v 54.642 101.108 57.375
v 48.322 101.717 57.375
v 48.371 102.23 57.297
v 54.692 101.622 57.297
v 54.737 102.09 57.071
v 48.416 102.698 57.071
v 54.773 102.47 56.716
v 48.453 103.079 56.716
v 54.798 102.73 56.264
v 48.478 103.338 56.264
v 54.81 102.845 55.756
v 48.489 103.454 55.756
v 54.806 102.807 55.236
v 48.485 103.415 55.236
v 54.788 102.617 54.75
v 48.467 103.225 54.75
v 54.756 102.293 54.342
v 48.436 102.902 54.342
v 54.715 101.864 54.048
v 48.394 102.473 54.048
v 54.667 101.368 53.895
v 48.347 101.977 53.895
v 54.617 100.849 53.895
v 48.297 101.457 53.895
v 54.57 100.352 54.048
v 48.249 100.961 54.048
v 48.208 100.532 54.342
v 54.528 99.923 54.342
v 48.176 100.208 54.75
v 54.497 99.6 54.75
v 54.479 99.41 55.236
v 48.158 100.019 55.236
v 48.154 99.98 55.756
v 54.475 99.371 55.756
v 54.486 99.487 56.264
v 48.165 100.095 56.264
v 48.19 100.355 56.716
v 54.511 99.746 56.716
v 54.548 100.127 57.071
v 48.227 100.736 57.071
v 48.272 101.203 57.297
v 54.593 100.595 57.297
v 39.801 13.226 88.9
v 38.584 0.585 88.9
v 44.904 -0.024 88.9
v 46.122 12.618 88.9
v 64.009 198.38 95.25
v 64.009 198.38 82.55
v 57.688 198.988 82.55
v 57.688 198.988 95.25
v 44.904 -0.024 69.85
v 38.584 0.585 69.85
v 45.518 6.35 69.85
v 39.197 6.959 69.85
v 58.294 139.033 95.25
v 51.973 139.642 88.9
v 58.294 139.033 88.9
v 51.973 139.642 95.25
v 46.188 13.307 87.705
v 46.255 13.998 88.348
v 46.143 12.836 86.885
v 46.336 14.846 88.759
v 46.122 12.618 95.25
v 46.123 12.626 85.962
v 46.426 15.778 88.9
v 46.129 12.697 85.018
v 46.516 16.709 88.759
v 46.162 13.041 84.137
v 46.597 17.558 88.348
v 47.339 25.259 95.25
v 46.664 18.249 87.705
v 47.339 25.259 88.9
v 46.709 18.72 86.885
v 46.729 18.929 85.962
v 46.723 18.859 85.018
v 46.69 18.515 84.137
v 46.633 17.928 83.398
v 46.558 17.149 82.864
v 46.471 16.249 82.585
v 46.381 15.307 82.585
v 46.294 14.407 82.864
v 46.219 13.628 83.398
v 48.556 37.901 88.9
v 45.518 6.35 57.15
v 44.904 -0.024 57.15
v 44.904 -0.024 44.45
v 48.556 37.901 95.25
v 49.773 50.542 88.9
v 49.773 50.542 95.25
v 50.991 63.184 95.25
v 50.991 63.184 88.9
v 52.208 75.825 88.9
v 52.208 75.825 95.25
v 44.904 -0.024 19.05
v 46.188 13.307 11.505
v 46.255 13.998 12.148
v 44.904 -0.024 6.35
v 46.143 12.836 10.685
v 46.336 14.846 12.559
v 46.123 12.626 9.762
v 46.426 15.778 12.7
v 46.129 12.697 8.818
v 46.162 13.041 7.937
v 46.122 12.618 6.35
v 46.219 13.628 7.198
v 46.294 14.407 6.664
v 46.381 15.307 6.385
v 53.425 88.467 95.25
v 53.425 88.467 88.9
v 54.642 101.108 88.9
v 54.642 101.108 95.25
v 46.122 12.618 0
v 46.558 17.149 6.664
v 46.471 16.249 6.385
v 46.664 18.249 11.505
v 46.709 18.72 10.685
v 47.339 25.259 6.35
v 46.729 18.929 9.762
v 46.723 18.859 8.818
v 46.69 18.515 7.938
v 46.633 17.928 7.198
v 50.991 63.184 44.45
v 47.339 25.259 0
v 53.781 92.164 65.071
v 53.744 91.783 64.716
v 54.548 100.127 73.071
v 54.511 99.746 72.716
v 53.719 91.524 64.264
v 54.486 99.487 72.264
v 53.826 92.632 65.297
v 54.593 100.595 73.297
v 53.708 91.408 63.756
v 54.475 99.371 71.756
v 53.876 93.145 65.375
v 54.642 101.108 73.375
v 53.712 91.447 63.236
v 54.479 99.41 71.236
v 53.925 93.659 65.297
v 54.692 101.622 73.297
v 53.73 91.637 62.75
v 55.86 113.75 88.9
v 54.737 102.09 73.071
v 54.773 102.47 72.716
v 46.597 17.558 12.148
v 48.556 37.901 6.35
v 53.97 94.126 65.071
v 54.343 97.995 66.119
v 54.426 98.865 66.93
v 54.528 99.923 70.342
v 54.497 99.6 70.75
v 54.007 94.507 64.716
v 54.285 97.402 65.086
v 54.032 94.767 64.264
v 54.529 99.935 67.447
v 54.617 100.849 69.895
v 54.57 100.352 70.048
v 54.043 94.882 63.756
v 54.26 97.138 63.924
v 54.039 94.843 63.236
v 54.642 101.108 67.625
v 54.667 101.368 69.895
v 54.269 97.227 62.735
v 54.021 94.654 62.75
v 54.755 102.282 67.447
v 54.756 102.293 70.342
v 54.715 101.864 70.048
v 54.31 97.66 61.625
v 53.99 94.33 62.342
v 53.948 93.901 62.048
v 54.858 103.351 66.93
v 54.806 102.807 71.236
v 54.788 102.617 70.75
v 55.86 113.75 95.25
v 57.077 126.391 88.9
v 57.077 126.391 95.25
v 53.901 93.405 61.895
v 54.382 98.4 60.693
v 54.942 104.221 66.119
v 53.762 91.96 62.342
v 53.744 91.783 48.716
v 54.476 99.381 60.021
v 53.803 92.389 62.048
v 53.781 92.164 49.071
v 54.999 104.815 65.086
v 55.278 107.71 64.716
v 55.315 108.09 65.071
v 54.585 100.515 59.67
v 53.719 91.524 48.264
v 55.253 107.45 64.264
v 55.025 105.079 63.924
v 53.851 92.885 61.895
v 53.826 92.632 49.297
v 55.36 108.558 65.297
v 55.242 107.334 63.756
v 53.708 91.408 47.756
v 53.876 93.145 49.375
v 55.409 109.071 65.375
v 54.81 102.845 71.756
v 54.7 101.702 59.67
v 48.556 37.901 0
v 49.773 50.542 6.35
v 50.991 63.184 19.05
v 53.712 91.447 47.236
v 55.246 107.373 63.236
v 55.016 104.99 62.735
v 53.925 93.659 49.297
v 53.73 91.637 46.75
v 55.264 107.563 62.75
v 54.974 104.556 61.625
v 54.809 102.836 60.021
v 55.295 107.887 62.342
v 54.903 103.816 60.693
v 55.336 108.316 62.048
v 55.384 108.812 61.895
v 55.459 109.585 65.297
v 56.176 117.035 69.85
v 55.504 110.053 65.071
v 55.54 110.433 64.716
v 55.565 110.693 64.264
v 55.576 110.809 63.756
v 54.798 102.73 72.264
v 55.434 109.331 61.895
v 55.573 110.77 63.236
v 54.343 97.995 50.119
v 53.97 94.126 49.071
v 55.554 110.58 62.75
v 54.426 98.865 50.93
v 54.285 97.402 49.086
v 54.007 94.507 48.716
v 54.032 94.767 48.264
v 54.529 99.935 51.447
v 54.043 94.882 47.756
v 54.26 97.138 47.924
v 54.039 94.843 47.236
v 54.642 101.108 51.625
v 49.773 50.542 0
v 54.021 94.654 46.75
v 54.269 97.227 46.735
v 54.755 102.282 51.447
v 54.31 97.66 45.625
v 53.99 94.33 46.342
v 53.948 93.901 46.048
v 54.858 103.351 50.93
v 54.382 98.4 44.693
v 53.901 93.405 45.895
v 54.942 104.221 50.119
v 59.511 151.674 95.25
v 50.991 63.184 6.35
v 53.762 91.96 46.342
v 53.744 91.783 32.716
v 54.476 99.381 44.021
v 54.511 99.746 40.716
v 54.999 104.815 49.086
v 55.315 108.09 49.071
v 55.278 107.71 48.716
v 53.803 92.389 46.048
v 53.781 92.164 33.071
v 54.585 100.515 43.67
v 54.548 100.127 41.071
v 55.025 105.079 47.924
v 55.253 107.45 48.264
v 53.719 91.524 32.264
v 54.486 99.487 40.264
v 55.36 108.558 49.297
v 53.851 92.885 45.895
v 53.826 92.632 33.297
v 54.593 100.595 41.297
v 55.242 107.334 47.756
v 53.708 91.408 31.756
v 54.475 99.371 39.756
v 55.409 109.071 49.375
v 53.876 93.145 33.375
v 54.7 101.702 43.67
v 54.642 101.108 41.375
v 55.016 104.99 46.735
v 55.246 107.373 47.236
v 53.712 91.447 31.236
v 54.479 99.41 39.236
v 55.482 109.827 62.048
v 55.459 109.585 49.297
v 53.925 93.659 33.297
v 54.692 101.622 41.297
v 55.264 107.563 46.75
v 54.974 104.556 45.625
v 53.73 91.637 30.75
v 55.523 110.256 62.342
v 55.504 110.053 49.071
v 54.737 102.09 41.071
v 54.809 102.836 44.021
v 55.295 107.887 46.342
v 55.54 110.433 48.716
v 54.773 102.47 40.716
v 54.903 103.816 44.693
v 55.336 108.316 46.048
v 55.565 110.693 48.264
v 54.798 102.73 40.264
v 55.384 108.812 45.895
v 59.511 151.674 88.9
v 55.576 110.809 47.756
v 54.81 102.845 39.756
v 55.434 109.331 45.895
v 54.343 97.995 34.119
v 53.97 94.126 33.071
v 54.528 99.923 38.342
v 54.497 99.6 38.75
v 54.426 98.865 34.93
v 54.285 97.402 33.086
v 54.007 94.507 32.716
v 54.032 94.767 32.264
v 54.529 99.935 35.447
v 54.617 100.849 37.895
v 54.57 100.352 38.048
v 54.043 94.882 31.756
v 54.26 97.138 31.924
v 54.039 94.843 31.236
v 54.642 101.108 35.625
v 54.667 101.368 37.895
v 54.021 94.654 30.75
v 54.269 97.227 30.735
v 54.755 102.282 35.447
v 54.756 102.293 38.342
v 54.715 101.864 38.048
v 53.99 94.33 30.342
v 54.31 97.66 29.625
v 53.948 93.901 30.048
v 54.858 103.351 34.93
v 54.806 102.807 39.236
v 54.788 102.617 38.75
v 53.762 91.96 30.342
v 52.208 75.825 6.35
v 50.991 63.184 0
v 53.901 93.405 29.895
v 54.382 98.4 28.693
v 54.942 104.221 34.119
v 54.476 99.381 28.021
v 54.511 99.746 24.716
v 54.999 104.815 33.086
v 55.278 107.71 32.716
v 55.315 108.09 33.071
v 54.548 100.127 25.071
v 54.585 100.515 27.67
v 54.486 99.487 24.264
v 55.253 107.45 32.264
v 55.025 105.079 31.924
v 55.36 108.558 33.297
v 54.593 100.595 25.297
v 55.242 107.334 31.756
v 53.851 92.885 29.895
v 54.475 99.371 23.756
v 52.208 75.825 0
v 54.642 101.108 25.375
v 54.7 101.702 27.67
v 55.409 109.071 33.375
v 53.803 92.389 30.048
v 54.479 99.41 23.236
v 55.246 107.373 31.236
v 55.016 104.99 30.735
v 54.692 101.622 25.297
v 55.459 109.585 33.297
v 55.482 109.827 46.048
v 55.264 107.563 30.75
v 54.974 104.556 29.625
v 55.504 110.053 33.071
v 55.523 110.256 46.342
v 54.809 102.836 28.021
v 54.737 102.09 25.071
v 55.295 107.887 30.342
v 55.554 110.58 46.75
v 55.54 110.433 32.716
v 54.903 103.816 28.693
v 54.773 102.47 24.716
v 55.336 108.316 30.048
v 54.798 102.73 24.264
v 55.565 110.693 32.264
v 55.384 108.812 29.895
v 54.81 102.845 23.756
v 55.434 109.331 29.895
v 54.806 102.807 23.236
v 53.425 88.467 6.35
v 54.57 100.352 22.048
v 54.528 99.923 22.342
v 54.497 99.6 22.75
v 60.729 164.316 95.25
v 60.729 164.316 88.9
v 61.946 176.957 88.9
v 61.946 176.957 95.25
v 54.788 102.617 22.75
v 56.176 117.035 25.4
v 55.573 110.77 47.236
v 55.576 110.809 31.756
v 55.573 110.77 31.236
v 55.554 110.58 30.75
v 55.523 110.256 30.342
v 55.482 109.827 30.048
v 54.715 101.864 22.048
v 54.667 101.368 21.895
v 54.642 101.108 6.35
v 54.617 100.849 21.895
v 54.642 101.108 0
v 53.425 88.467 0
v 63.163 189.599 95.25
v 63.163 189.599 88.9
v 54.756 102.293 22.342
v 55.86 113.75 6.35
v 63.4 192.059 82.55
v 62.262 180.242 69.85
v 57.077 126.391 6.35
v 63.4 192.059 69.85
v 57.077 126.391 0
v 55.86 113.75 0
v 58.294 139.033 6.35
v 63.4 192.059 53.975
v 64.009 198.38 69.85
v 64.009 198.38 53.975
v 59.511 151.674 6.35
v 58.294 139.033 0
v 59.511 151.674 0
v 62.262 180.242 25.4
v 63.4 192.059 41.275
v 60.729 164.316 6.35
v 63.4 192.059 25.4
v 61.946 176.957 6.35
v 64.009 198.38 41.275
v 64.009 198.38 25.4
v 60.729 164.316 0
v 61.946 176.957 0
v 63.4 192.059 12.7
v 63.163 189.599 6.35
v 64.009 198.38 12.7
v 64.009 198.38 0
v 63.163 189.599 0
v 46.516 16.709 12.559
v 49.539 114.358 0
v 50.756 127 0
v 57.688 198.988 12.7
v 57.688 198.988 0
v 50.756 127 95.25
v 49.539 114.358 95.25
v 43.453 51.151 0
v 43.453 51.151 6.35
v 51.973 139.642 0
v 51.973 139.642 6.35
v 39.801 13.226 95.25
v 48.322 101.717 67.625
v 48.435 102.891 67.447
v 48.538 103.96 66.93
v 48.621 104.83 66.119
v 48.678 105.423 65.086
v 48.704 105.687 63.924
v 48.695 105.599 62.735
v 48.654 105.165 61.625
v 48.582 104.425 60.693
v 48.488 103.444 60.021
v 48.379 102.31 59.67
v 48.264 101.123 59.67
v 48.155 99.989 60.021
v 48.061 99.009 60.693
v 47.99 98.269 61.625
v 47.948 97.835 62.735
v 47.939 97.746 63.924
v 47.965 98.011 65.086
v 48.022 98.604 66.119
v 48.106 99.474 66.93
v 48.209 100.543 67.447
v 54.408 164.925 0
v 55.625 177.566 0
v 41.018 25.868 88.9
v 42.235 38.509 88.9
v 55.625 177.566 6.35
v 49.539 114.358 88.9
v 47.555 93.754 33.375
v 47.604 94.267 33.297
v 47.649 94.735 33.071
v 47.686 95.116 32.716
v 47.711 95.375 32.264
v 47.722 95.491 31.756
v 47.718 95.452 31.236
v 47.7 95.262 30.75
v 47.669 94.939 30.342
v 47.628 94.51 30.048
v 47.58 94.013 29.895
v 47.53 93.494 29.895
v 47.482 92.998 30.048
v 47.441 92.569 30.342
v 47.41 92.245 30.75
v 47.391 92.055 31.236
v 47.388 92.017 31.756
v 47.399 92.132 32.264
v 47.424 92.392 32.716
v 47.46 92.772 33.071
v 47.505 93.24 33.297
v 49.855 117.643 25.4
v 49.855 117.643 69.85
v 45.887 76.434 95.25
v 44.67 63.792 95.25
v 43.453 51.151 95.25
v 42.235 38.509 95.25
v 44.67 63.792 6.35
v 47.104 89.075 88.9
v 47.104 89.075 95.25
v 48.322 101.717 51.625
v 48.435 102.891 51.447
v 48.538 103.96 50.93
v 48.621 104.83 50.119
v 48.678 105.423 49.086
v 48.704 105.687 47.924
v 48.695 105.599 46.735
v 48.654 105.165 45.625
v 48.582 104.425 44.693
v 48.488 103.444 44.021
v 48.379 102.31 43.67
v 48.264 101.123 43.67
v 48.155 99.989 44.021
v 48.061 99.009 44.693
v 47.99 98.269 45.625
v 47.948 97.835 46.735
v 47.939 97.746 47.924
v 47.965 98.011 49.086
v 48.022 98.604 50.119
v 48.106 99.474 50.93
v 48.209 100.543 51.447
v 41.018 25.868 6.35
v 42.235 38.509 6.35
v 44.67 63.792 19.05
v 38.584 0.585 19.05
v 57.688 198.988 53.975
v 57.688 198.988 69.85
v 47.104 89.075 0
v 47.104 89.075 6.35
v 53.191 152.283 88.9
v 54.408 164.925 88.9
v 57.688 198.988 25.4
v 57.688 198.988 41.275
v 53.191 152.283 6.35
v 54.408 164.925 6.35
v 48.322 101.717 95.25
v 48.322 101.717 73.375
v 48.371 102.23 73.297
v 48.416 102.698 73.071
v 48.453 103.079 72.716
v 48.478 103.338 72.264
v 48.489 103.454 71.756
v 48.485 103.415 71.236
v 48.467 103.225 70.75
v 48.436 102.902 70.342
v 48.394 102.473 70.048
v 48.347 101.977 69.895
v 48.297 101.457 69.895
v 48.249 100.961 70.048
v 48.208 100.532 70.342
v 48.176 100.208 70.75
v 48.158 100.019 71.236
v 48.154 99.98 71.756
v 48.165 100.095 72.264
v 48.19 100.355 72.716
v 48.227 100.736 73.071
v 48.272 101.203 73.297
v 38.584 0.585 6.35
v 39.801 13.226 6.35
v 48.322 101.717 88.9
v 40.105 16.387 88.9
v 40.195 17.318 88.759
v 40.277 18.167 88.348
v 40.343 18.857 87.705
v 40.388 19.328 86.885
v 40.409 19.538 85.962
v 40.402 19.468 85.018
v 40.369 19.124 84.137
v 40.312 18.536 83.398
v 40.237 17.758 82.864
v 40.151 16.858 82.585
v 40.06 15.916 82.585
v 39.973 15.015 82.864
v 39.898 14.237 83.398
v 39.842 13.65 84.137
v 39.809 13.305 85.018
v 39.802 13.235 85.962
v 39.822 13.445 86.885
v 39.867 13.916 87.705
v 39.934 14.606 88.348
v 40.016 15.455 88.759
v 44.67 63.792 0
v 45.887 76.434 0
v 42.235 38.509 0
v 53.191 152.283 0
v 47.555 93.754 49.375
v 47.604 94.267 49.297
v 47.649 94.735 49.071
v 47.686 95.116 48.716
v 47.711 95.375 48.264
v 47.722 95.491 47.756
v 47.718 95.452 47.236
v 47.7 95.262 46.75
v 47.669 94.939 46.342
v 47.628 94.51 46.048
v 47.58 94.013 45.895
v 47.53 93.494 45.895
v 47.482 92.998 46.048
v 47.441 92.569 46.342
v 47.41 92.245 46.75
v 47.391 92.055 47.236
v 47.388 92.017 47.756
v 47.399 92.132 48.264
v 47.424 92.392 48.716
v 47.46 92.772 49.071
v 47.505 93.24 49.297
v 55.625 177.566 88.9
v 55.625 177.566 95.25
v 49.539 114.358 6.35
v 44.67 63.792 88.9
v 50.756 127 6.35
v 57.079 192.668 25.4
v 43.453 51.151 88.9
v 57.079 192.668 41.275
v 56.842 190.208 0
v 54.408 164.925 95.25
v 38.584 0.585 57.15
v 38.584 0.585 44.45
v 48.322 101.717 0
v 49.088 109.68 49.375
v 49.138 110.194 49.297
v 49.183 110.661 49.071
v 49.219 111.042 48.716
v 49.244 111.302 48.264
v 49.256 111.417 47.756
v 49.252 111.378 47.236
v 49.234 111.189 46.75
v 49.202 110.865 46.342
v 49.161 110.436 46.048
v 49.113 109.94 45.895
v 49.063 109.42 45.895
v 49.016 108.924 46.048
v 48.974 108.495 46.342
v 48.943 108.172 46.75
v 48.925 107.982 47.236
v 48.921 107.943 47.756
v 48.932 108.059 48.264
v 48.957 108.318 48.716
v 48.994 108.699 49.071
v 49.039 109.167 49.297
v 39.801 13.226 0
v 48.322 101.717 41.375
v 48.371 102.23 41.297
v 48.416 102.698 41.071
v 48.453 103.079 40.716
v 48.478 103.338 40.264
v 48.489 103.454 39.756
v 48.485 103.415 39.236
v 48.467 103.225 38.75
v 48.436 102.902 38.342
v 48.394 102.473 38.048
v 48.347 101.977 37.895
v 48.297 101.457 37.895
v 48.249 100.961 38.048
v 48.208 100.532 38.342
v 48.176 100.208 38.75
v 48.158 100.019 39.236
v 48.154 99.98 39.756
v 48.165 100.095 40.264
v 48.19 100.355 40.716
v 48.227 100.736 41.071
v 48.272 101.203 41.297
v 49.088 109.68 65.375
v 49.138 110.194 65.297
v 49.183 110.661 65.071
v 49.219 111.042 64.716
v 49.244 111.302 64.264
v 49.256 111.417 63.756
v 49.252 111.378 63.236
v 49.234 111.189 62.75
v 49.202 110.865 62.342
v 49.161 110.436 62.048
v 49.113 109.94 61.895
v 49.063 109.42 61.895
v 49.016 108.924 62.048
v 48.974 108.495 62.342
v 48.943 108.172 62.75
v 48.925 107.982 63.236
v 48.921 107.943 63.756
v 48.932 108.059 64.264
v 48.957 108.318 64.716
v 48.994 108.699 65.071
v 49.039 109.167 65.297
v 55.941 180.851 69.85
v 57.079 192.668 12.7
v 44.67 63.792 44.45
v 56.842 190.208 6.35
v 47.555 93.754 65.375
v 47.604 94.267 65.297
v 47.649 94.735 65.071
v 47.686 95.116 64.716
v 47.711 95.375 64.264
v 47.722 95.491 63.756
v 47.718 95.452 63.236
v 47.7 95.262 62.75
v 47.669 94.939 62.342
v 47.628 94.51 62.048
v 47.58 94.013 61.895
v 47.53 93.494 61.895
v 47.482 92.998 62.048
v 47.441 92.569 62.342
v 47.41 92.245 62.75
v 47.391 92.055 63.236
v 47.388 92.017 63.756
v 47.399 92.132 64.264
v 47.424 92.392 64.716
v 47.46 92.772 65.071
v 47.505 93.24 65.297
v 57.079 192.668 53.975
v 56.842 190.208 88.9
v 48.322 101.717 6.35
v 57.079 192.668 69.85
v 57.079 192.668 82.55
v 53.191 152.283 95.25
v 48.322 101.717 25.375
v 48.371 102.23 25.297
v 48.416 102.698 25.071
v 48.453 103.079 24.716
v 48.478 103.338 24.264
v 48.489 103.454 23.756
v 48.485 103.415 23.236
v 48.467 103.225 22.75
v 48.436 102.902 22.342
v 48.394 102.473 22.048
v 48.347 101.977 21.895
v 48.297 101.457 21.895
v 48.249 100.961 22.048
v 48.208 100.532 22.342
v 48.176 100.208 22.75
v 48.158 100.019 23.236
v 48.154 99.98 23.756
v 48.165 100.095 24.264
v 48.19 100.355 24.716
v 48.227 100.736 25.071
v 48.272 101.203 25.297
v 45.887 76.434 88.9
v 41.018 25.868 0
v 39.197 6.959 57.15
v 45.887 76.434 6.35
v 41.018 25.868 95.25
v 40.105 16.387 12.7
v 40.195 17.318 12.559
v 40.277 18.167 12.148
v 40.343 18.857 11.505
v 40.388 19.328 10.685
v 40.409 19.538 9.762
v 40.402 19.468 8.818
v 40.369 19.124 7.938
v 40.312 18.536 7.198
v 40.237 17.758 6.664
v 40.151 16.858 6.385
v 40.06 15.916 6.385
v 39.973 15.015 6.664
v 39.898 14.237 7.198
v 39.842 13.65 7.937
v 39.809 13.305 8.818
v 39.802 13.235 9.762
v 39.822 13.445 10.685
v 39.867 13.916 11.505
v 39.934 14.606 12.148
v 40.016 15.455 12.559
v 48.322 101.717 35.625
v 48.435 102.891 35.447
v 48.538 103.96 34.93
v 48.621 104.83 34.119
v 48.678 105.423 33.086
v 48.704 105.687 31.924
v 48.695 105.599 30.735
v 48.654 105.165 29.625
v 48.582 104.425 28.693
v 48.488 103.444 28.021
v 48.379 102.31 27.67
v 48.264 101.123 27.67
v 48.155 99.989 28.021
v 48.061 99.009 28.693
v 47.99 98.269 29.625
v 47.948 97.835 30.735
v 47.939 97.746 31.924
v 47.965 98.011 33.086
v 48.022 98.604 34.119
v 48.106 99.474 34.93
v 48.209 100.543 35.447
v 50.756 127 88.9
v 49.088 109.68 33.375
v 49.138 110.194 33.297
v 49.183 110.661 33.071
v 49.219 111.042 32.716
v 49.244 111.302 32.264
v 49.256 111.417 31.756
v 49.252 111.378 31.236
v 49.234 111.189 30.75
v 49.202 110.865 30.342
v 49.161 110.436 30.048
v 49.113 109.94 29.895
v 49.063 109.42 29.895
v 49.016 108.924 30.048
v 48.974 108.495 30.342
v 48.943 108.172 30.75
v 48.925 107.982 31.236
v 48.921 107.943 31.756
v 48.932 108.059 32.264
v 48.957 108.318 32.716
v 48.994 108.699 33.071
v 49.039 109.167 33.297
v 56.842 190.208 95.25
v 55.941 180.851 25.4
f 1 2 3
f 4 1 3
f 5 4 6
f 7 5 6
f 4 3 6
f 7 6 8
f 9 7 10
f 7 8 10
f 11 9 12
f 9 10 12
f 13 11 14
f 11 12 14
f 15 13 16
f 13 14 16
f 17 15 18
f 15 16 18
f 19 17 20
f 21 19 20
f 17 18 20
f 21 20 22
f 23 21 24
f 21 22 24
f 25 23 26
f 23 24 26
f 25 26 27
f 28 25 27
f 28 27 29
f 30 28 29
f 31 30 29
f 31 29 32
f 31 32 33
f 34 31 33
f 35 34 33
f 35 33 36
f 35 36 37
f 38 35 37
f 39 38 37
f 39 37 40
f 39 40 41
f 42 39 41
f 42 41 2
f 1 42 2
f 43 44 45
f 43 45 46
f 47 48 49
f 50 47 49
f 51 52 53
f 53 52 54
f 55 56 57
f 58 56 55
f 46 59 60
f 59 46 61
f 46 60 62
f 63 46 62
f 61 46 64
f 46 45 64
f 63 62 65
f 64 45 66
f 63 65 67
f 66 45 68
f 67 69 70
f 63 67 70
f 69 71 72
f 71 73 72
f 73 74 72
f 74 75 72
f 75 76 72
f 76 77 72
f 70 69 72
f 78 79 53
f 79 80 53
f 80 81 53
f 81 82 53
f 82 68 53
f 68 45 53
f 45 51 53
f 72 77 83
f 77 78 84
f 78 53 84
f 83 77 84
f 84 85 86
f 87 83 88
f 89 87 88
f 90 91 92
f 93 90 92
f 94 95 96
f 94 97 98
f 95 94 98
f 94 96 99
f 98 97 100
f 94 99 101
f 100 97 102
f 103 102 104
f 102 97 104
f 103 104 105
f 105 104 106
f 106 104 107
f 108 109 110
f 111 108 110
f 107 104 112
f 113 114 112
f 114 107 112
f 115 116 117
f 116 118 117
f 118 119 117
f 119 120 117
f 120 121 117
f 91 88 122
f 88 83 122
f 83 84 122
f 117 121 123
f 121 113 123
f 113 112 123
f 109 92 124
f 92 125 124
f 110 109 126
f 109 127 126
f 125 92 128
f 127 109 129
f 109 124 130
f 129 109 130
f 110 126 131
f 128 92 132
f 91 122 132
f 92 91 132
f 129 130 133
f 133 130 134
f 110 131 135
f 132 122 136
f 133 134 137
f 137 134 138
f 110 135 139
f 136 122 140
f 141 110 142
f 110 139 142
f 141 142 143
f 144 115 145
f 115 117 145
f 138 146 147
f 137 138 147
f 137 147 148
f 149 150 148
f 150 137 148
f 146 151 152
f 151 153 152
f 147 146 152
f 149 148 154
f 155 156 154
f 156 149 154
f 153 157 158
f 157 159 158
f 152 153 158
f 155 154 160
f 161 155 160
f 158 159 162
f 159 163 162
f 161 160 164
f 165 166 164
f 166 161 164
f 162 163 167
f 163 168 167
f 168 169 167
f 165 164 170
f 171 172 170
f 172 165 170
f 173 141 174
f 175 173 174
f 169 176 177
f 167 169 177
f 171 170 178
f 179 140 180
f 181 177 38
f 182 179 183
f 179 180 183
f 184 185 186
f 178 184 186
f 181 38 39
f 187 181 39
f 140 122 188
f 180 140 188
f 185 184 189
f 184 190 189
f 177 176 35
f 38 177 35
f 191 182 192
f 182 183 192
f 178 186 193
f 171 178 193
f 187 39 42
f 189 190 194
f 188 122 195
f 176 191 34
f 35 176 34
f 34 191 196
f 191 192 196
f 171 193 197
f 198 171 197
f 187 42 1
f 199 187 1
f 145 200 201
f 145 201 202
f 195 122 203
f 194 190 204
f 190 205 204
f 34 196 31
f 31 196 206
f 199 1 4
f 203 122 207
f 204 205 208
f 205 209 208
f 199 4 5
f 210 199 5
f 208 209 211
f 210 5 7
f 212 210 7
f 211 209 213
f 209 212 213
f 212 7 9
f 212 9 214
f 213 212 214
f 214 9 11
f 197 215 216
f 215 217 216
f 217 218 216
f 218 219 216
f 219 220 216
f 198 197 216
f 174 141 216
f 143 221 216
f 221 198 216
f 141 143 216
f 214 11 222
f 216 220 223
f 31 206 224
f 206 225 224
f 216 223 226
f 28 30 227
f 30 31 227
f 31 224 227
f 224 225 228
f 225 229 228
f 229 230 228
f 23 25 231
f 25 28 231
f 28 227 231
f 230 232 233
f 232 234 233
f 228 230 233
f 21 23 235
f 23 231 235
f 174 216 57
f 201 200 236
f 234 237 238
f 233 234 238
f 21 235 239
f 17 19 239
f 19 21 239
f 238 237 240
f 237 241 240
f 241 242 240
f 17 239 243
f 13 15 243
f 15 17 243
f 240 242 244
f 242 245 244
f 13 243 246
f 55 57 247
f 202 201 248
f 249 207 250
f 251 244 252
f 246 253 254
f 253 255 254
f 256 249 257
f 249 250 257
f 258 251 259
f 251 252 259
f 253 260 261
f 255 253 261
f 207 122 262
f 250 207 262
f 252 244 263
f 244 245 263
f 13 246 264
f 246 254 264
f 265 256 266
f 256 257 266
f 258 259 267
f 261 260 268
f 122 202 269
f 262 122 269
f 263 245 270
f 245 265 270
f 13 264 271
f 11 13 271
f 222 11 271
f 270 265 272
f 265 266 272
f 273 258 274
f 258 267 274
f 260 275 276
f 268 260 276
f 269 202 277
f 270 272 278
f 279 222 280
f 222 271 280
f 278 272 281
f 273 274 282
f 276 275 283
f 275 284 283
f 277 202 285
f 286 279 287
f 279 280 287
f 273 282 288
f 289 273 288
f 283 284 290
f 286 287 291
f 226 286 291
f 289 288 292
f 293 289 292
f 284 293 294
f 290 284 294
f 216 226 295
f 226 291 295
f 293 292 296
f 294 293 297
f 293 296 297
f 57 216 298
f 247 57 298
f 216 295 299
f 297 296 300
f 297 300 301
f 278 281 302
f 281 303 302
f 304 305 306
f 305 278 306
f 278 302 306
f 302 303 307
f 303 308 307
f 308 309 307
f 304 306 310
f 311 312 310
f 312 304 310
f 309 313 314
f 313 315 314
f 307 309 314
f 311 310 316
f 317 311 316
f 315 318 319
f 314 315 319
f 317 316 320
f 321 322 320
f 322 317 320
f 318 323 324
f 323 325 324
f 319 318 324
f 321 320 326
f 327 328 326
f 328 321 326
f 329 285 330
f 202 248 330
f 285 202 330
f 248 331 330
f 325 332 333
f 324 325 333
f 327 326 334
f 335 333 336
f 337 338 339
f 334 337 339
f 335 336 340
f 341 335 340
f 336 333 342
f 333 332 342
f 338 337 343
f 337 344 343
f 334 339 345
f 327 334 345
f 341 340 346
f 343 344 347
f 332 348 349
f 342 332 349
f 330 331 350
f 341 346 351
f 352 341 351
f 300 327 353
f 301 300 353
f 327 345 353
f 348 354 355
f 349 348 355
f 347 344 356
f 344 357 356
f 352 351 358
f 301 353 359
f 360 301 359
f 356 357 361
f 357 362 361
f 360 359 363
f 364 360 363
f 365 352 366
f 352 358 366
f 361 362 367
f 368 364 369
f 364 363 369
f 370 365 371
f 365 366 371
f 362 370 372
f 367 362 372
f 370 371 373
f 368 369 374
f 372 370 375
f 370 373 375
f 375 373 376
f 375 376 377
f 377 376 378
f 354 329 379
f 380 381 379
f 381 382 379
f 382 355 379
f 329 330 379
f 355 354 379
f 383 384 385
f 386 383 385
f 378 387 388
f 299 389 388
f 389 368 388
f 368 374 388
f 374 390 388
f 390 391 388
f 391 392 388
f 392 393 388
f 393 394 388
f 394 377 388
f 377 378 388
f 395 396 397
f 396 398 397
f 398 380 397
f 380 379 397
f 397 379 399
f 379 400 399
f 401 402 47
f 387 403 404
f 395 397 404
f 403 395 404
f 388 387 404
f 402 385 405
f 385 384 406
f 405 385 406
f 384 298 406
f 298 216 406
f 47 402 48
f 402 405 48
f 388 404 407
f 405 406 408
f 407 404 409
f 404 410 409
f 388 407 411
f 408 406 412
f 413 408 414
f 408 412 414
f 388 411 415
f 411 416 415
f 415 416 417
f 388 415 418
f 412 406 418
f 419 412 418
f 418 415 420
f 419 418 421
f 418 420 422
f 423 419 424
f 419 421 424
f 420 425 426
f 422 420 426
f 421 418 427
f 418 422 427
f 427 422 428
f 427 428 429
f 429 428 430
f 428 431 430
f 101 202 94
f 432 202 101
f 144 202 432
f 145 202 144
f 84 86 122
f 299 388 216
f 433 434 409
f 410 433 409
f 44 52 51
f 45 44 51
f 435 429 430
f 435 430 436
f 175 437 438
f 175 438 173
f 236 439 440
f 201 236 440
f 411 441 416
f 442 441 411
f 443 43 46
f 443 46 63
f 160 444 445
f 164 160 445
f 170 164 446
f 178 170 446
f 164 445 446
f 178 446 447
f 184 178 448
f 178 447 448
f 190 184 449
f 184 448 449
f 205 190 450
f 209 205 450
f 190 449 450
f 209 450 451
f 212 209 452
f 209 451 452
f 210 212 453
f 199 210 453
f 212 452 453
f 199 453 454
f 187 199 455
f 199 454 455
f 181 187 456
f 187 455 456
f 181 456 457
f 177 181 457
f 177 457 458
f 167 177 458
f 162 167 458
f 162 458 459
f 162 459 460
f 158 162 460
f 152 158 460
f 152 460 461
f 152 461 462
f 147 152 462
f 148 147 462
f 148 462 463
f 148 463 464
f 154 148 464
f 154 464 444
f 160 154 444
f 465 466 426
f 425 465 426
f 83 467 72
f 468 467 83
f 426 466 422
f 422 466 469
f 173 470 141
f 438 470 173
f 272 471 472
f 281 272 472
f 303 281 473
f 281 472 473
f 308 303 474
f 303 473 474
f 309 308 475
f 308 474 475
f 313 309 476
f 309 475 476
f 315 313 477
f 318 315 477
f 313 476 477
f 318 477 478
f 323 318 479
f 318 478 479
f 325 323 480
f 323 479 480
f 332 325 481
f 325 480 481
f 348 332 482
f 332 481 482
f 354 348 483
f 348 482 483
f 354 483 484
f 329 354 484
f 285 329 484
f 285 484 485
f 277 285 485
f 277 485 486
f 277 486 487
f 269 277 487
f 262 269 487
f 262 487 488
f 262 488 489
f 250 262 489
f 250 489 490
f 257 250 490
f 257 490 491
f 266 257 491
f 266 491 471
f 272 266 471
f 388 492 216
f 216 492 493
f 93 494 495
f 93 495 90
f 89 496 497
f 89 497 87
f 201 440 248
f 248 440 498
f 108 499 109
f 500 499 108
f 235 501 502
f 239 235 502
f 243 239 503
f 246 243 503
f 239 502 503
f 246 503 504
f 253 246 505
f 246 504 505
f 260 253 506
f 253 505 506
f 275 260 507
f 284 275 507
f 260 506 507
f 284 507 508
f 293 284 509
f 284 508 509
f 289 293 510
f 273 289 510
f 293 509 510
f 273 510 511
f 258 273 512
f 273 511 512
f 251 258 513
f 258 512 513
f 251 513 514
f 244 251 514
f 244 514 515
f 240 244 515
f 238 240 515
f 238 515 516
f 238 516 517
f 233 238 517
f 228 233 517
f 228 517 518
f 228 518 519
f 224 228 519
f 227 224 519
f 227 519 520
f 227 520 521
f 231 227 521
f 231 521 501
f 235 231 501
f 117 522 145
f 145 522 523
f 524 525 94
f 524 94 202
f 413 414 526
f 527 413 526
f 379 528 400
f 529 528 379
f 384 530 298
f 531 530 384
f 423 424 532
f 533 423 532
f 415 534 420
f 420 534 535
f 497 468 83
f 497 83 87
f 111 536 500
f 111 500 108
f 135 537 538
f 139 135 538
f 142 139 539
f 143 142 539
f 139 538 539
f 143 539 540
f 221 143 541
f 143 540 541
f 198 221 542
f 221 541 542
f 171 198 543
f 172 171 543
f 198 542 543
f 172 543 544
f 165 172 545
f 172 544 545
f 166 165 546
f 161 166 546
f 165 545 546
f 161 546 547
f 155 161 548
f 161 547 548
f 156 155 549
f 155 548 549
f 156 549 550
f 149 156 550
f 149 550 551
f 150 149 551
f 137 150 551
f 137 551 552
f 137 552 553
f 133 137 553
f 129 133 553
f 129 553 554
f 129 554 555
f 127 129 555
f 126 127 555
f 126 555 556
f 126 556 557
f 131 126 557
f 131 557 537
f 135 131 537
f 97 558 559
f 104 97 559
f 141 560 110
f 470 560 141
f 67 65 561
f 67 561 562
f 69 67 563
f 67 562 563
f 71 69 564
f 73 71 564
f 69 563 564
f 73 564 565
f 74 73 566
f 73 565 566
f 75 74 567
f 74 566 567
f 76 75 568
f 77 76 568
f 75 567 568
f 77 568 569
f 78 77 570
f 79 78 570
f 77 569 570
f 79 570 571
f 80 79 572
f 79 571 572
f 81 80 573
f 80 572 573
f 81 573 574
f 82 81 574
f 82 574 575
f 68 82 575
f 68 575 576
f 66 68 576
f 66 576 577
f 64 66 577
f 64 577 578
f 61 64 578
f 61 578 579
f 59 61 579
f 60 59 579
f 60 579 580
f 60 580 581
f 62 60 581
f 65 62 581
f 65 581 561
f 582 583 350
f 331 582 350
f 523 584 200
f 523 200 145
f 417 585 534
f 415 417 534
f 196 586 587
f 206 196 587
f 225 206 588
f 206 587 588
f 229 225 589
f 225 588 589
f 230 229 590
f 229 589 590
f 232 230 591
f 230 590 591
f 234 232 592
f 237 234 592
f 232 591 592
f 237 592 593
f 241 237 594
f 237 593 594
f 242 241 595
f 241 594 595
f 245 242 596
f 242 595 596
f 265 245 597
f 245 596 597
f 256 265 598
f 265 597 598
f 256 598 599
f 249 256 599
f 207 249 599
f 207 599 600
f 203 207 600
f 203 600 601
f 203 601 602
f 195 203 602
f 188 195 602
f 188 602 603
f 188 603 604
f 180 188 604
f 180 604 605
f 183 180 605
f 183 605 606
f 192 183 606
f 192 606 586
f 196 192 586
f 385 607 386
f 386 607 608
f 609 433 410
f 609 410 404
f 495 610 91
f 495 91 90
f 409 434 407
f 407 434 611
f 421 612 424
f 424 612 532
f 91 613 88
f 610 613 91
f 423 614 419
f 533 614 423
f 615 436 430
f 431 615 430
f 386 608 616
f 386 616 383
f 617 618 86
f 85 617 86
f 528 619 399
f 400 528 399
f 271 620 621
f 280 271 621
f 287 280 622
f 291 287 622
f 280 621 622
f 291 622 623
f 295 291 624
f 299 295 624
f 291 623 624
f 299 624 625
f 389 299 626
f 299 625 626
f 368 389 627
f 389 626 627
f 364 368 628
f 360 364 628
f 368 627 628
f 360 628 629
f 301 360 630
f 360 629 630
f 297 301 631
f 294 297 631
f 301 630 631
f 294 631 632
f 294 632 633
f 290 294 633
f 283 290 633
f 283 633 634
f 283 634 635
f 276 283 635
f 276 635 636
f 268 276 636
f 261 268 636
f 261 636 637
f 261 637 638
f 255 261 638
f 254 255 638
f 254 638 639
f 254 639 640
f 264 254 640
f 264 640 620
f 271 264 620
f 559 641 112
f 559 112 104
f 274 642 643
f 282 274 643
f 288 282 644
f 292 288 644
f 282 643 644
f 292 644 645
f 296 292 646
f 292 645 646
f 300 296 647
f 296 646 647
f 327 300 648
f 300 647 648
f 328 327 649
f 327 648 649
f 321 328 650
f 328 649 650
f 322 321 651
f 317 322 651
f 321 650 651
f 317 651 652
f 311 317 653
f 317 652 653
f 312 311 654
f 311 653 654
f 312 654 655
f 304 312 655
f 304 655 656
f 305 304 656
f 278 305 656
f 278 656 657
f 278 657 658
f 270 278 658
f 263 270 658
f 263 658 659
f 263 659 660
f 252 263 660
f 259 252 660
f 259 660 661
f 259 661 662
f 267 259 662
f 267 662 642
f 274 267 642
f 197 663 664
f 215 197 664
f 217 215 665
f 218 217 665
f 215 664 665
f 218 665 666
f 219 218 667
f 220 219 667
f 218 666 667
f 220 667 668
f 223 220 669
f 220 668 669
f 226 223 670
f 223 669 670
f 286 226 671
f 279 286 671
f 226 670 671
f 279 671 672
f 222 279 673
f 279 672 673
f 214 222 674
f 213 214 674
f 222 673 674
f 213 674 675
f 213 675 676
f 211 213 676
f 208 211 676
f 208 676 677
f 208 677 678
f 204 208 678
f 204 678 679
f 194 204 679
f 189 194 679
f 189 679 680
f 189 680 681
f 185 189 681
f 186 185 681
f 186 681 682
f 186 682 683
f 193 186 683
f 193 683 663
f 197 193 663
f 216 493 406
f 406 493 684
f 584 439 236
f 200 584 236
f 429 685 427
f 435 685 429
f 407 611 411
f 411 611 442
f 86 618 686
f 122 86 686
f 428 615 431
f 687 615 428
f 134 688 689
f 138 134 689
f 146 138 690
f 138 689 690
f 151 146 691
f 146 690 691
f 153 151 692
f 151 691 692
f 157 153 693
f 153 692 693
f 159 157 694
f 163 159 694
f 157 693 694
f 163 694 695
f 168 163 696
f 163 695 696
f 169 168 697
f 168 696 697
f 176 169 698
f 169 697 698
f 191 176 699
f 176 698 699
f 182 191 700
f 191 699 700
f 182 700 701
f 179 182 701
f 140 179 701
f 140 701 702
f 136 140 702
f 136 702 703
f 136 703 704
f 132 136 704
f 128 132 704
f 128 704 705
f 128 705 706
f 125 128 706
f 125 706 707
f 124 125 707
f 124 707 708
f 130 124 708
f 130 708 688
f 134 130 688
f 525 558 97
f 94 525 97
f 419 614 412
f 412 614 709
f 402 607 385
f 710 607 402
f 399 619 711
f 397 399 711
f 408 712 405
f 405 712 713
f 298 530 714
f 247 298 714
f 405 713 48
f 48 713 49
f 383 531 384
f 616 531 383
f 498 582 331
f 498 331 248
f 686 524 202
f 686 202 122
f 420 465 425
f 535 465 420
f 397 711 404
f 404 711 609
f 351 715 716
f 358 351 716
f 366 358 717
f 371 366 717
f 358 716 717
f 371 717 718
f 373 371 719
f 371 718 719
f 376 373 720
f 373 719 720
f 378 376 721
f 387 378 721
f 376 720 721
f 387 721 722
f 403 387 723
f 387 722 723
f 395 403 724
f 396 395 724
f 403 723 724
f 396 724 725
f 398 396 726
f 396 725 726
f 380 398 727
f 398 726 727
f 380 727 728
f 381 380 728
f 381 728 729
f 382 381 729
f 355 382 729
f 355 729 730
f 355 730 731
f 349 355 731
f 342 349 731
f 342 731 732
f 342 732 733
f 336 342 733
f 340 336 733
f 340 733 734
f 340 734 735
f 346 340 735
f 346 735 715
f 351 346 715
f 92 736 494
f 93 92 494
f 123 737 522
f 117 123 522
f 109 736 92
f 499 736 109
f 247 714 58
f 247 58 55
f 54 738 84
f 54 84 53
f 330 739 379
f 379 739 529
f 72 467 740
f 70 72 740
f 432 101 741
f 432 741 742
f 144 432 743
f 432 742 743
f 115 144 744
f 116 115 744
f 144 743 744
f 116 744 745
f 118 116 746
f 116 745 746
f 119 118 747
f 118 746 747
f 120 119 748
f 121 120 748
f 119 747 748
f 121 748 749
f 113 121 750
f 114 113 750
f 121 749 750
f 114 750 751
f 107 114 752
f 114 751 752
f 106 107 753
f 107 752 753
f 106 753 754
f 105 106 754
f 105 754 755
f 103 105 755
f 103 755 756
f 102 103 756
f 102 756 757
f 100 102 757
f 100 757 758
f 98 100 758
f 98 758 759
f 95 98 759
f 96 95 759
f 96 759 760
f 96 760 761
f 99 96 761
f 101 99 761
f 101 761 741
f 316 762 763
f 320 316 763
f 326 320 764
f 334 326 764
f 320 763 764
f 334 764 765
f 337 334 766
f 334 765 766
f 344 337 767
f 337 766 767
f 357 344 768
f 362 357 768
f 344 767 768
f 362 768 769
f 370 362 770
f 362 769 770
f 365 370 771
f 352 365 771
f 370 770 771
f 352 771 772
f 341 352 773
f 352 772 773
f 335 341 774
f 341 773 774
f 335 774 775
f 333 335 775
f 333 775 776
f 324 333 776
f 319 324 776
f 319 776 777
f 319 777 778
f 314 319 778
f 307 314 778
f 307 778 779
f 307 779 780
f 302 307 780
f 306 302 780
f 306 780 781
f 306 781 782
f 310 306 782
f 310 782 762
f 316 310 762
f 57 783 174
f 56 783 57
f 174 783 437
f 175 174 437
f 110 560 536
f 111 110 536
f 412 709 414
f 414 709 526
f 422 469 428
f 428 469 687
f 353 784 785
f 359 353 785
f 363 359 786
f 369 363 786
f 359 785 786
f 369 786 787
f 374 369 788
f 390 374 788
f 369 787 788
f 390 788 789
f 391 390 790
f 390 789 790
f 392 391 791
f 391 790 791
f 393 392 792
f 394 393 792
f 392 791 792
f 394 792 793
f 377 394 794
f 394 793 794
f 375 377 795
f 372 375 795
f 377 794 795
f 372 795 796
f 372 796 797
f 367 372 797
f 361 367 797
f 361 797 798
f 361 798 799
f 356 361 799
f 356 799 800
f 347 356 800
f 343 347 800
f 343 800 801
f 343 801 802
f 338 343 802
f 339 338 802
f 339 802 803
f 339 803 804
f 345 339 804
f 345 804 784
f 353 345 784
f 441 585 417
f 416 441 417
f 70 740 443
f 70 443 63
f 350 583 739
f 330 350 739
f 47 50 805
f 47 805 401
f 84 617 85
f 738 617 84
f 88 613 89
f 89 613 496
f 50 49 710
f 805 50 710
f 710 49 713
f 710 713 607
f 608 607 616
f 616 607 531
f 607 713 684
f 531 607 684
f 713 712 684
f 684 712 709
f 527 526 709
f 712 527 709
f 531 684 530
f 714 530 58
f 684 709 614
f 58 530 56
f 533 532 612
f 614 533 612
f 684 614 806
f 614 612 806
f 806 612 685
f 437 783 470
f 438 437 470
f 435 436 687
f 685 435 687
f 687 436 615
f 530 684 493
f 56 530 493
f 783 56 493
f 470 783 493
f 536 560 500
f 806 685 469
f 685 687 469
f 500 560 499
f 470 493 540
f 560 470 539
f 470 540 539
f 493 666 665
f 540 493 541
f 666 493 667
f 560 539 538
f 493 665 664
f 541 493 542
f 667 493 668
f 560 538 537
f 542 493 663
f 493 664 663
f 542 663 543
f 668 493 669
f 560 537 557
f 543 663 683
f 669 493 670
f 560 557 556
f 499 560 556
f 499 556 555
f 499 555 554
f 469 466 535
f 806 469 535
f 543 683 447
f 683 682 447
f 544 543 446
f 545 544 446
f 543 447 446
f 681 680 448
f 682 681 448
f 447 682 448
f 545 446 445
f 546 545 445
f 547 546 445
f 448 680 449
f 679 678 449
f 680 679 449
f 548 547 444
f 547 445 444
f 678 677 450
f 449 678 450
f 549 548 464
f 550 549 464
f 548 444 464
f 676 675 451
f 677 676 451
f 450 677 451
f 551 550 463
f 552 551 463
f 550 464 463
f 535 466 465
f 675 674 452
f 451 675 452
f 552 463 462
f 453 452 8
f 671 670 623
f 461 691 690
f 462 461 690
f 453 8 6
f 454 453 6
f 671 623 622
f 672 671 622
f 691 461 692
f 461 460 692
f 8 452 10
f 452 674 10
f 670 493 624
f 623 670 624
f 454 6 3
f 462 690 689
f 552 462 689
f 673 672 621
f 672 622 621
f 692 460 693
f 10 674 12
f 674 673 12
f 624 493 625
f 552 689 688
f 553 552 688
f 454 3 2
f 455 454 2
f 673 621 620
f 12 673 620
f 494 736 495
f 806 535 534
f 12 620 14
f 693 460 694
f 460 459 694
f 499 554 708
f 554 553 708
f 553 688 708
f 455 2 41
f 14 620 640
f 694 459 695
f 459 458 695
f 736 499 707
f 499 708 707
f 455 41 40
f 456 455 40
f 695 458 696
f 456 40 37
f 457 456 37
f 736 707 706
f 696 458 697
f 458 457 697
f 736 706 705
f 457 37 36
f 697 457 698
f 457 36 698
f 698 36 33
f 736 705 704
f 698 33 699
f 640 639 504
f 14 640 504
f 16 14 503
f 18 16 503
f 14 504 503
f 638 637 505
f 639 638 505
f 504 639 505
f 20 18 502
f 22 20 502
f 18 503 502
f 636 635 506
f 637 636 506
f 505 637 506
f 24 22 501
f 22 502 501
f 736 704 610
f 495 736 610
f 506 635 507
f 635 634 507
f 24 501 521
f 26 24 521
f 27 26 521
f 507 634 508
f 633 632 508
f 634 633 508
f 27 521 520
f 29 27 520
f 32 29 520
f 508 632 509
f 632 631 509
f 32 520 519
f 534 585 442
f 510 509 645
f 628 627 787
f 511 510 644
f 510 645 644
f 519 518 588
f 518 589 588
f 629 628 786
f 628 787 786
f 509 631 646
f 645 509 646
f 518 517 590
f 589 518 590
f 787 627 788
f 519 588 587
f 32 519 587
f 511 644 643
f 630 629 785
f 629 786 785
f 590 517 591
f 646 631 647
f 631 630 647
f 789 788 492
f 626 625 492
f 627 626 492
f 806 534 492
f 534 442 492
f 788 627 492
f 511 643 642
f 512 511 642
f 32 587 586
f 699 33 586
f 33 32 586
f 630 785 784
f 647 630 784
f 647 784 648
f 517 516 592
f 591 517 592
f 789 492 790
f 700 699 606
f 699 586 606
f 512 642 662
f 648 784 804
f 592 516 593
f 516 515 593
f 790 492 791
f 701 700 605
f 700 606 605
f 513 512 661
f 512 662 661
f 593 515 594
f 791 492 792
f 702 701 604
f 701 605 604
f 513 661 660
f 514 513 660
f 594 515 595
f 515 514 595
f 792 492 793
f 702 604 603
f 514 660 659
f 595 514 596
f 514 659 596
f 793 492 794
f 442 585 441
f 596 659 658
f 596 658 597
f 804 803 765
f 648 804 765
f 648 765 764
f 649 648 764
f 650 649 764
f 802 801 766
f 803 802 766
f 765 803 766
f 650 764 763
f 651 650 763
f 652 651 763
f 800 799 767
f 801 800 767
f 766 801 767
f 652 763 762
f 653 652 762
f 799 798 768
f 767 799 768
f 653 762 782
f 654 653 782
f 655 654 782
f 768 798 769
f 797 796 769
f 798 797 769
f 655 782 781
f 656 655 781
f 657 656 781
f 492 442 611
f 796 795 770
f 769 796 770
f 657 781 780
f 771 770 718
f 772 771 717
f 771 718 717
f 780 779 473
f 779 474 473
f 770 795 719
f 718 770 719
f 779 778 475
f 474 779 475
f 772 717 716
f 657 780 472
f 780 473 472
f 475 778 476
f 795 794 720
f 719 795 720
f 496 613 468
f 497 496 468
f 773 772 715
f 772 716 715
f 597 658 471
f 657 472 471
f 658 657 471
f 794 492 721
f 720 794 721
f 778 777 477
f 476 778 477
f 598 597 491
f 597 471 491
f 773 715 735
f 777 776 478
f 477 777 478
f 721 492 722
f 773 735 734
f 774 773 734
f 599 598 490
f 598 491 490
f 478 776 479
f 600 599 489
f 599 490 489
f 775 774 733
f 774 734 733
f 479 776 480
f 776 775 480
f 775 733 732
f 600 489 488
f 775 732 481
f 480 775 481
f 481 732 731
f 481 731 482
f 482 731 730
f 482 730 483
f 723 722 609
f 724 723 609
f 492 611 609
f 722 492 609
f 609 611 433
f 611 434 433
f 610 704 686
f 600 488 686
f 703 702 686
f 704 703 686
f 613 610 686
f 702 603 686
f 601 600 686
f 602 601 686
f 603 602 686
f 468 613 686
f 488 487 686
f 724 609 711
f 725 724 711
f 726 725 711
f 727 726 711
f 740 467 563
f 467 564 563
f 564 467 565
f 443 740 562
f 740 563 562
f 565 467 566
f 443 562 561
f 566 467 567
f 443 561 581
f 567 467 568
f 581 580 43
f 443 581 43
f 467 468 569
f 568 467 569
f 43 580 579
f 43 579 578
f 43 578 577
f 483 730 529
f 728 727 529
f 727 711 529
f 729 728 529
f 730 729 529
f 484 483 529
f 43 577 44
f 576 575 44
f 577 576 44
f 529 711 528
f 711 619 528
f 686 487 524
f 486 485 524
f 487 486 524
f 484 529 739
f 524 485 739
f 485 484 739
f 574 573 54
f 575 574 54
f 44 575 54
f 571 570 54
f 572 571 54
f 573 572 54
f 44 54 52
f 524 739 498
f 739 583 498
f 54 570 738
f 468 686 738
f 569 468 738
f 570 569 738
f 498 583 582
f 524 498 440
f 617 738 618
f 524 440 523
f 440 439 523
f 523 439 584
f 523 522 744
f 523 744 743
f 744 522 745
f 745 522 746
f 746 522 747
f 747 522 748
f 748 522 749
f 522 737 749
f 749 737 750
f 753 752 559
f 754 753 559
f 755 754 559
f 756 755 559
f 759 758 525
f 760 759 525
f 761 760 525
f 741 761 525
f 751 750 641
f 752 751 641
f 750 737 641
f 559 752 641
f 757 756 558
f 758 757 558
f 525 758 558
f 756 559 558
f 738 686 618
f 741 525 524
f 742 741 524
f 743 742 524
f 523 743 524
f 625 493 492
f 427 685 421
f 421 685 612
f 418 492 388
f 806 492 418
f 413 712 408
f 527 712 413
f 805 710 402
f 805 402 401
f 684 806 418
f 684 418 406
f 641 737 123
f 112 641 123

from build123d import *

# Parameters (mm, degrees)
BOSS_EXTRUDE1_DEPTH = 95.25
SKETCH3_R           = 3.175
CUT_EXTRUDE1_DEPTH  = 26.366155757
SKETCH4_R           = 4
SKETCH4_R_2         = 1.75
CUT_EXTRUDE2_DEPTH  = 26.366155757
LPATTERN1_COUNT     = 2
LPATTERN1_PITCH     = 16
LPATTERN1_COL_COUNT = 2
LPATTERN1_COL_PITCH = 16
SKETCH5_W           = 44.45
SKETCH5_H           = 63.5
CUT_EXTRUDE3_DEPTH  = 26.366155757
SKETCH6_W           = 25.4
SKETCH6_H           = 63.5
CUT_EXTRUDE4_DEPTH  = 26.366155757
SKETCH8_W           = 6.35
SKETCH8_H           = 12.7
CUT_EXTRUDE6_DEPTH  = 26.366155757
LPATTERN2_COUNT     = 18
LPATTERN2_PITCH     = 25.4
SKETCH9_W           = 12.7
SKETCH9_H           = 6.403441613
CUT_EXTRUDE7_DEPTH  = 26.366155757
SKETCH10_W          = 12.7
SKETCH10_H          = 6.35
CUT_EXTRUDE8_DEPTH  = 26.366155757


with BuildPart() as part:
    # Sketch2 → Boss-Extrude1 (new body)
    with BuildSketch(Plane.XY):
        Polygon((38.583668647, 0.58465909), (44.904434507, -0.023961438), (64.008541785, 198.379778502), (57.687775925, 198.988399031), align=None)
    extrude(amount=BOSS_EXTRUDE1_DEPTH)

    # Sketch3 → Cut-Extrude1 (cut, through all)
    with BuildSketch(Plane(origin=(38.173444207, -3.675684609, 0), x_dir=(0, 0, 1), z_dir=(-0.995396198, 0.095845753, 0))):
        with Locations((9.525, 20.155048192)):
            Circle(SKETCH3_R)
        with Locations((85.725, 20.155048192)):
            Circle(SKETCH3_R)
    extrude(amount=-CUT_EXTRUDE1_DEPTH, mode=Mode.SUBTRACT)

    # Sketch4 → Cut-Extrude2 (cut, through all)
    with BuildSketch(Plane(origin=(38.173444207, -3.675684609, 0), x_dir=(0, 0, 1), z_dir=(-0.995396198, 0.095845753, 0))):
        with Locations((47.625, 105.880048192)):
            Circle(SKETCH4_R)
        with Locations((47.625, 113.880048192)):
            Circle(SKETCH4_R_2)
        with Locations((55.625, 105.880048192)):
            Circle(SKETCH4_R_2)
        with Locations((47.625, 97.880048192)):
            Circle(SKETCH4_R_2)
        with Locations((39.625, 105.880048192)):
            Circle(SKETCH4_R_2)
    cut_extrude2 = extrude(amount=-CUT_EXTRUDE2_DEPTH, mode=Mode.SUBTRACT)

    # LPattern1: Cut-Extrude2 ×2
    with Locations(*[(0, 0, i * LPATTERN1_PITCH) for i in range(1, LPATTERN1_COUNT)]):
        add(cut_extrude2, mode=Mode.SUBTRACT)

    # LPattern1 col: Cut-Extrude2 ×2
    with Locations(*[(0, 0, -i * LPATTERN1_COL_PITCH) for i in range(1, LPATTERN1_COL_COUNT)]):
        add(cut_extrude2, mode=Mode.SUBTRACT)

    # Sketch5 → Cut-Extrude3 (cut, through all)
    with BuildSketch(Plane(origin=(38.173444207, -3.675684609, 0), x_dir=(0, 0, 1), z_dir=(-0.995396198, 0.095845753, 0))):
        with Locations((47.625, 153.630048192)):
            Rectangle(SKETCH5_W, SKETCH5_H)
    extrude(amount=-CUT_EXTRUDE3_DEPTH, mode=Mode.SUBTRACT)

    # Sketch6 → Cut-Extrude4 (cut, through all)
    with BuildSketch(Plane(origin=(38.173444207, -3.675684609, 0), x_dir=(0, 0, 1), z_dir=(-0.995396198, 0.095845753, 0))):
        with Locations((31.75, 36.030048192)):
            Rectangle(SKETCH6_W, SKETCH6_H)
    extrude(amount=-CUT_EXTRUDE4_DEPTH, mode=Mode.SUBTRACT)

    # Sketch8 → Cut-Extrude6 (cut, through all)
    with BuildSketch(Plane(origin=(38.173444207, -3.675684609, 0), x_dir=(0, 0, 1), z_dir=(-0.995396198, 0.095845753, 0))):
        with Locations((3.175, 10.630048192)):
            Rectangle(SKETCH8_W, SKETCH8_H)
        with Locations((92.075, 10.630048192)):
            Rectangle(SKETCH8_W, SKETCH8_H)
    cut_extrude6 = extrude(amount=-CUT_EXTRUDE6_DEPTH, mode=Mode.SUBTRACT)

    # LPattern2: Cut-Extrude6 ×18
    with Locations(*[Vector(0.095845753, 0.995396198, 0) * (i * LPATTERN2_PITCH) for i in range(1, LPATTERN2_COUNT)]):
        add(cut_extrude6, mode=Mode.SUBTRACT)

    # Sketch9 → Cut-Extrude7 (cut, through all)
    with BuildSketch(Plane(origin=(38.173444207, -3.675684609, 0), x_dir=(0, 0, 1), z_dir=(-0.995396198, 0.095845753, 0))):
        with Locations((63.5, 7.481768999)):
            Rectangle(SKETCH9_W, SKETCH9_H)
    extrude(amount=-CUT_EXTRUDE7_DEPTH, mode=Mode.SUBTRACT)

    # Sketch10 → Cut-Extrude8 (cut, through all)
    with BuildSketch(Plane(origin=(38.173444207, -3.675684609, 0), x_dir=(0, 0, 1), z_dir=(-0.995396198, 0.095845753, 0))):
        with Locations((19.05, 200.426424209)):
            Rectangle(SKETCH10_W, SKETCH10_H)
        with Locations((47.625, 200.426424209)):
            Rectangle(SKETCH10_W, SKETCH10_H)
        with Locations((76.2, 200.426424209)):
            Rectangle(SKETCH10_W, SKETCH10_H)
    extrude(amount=-CUT_EXTRUDE8_DEPTH, mode=Mode.SUBTRACT)


solid = part.part
